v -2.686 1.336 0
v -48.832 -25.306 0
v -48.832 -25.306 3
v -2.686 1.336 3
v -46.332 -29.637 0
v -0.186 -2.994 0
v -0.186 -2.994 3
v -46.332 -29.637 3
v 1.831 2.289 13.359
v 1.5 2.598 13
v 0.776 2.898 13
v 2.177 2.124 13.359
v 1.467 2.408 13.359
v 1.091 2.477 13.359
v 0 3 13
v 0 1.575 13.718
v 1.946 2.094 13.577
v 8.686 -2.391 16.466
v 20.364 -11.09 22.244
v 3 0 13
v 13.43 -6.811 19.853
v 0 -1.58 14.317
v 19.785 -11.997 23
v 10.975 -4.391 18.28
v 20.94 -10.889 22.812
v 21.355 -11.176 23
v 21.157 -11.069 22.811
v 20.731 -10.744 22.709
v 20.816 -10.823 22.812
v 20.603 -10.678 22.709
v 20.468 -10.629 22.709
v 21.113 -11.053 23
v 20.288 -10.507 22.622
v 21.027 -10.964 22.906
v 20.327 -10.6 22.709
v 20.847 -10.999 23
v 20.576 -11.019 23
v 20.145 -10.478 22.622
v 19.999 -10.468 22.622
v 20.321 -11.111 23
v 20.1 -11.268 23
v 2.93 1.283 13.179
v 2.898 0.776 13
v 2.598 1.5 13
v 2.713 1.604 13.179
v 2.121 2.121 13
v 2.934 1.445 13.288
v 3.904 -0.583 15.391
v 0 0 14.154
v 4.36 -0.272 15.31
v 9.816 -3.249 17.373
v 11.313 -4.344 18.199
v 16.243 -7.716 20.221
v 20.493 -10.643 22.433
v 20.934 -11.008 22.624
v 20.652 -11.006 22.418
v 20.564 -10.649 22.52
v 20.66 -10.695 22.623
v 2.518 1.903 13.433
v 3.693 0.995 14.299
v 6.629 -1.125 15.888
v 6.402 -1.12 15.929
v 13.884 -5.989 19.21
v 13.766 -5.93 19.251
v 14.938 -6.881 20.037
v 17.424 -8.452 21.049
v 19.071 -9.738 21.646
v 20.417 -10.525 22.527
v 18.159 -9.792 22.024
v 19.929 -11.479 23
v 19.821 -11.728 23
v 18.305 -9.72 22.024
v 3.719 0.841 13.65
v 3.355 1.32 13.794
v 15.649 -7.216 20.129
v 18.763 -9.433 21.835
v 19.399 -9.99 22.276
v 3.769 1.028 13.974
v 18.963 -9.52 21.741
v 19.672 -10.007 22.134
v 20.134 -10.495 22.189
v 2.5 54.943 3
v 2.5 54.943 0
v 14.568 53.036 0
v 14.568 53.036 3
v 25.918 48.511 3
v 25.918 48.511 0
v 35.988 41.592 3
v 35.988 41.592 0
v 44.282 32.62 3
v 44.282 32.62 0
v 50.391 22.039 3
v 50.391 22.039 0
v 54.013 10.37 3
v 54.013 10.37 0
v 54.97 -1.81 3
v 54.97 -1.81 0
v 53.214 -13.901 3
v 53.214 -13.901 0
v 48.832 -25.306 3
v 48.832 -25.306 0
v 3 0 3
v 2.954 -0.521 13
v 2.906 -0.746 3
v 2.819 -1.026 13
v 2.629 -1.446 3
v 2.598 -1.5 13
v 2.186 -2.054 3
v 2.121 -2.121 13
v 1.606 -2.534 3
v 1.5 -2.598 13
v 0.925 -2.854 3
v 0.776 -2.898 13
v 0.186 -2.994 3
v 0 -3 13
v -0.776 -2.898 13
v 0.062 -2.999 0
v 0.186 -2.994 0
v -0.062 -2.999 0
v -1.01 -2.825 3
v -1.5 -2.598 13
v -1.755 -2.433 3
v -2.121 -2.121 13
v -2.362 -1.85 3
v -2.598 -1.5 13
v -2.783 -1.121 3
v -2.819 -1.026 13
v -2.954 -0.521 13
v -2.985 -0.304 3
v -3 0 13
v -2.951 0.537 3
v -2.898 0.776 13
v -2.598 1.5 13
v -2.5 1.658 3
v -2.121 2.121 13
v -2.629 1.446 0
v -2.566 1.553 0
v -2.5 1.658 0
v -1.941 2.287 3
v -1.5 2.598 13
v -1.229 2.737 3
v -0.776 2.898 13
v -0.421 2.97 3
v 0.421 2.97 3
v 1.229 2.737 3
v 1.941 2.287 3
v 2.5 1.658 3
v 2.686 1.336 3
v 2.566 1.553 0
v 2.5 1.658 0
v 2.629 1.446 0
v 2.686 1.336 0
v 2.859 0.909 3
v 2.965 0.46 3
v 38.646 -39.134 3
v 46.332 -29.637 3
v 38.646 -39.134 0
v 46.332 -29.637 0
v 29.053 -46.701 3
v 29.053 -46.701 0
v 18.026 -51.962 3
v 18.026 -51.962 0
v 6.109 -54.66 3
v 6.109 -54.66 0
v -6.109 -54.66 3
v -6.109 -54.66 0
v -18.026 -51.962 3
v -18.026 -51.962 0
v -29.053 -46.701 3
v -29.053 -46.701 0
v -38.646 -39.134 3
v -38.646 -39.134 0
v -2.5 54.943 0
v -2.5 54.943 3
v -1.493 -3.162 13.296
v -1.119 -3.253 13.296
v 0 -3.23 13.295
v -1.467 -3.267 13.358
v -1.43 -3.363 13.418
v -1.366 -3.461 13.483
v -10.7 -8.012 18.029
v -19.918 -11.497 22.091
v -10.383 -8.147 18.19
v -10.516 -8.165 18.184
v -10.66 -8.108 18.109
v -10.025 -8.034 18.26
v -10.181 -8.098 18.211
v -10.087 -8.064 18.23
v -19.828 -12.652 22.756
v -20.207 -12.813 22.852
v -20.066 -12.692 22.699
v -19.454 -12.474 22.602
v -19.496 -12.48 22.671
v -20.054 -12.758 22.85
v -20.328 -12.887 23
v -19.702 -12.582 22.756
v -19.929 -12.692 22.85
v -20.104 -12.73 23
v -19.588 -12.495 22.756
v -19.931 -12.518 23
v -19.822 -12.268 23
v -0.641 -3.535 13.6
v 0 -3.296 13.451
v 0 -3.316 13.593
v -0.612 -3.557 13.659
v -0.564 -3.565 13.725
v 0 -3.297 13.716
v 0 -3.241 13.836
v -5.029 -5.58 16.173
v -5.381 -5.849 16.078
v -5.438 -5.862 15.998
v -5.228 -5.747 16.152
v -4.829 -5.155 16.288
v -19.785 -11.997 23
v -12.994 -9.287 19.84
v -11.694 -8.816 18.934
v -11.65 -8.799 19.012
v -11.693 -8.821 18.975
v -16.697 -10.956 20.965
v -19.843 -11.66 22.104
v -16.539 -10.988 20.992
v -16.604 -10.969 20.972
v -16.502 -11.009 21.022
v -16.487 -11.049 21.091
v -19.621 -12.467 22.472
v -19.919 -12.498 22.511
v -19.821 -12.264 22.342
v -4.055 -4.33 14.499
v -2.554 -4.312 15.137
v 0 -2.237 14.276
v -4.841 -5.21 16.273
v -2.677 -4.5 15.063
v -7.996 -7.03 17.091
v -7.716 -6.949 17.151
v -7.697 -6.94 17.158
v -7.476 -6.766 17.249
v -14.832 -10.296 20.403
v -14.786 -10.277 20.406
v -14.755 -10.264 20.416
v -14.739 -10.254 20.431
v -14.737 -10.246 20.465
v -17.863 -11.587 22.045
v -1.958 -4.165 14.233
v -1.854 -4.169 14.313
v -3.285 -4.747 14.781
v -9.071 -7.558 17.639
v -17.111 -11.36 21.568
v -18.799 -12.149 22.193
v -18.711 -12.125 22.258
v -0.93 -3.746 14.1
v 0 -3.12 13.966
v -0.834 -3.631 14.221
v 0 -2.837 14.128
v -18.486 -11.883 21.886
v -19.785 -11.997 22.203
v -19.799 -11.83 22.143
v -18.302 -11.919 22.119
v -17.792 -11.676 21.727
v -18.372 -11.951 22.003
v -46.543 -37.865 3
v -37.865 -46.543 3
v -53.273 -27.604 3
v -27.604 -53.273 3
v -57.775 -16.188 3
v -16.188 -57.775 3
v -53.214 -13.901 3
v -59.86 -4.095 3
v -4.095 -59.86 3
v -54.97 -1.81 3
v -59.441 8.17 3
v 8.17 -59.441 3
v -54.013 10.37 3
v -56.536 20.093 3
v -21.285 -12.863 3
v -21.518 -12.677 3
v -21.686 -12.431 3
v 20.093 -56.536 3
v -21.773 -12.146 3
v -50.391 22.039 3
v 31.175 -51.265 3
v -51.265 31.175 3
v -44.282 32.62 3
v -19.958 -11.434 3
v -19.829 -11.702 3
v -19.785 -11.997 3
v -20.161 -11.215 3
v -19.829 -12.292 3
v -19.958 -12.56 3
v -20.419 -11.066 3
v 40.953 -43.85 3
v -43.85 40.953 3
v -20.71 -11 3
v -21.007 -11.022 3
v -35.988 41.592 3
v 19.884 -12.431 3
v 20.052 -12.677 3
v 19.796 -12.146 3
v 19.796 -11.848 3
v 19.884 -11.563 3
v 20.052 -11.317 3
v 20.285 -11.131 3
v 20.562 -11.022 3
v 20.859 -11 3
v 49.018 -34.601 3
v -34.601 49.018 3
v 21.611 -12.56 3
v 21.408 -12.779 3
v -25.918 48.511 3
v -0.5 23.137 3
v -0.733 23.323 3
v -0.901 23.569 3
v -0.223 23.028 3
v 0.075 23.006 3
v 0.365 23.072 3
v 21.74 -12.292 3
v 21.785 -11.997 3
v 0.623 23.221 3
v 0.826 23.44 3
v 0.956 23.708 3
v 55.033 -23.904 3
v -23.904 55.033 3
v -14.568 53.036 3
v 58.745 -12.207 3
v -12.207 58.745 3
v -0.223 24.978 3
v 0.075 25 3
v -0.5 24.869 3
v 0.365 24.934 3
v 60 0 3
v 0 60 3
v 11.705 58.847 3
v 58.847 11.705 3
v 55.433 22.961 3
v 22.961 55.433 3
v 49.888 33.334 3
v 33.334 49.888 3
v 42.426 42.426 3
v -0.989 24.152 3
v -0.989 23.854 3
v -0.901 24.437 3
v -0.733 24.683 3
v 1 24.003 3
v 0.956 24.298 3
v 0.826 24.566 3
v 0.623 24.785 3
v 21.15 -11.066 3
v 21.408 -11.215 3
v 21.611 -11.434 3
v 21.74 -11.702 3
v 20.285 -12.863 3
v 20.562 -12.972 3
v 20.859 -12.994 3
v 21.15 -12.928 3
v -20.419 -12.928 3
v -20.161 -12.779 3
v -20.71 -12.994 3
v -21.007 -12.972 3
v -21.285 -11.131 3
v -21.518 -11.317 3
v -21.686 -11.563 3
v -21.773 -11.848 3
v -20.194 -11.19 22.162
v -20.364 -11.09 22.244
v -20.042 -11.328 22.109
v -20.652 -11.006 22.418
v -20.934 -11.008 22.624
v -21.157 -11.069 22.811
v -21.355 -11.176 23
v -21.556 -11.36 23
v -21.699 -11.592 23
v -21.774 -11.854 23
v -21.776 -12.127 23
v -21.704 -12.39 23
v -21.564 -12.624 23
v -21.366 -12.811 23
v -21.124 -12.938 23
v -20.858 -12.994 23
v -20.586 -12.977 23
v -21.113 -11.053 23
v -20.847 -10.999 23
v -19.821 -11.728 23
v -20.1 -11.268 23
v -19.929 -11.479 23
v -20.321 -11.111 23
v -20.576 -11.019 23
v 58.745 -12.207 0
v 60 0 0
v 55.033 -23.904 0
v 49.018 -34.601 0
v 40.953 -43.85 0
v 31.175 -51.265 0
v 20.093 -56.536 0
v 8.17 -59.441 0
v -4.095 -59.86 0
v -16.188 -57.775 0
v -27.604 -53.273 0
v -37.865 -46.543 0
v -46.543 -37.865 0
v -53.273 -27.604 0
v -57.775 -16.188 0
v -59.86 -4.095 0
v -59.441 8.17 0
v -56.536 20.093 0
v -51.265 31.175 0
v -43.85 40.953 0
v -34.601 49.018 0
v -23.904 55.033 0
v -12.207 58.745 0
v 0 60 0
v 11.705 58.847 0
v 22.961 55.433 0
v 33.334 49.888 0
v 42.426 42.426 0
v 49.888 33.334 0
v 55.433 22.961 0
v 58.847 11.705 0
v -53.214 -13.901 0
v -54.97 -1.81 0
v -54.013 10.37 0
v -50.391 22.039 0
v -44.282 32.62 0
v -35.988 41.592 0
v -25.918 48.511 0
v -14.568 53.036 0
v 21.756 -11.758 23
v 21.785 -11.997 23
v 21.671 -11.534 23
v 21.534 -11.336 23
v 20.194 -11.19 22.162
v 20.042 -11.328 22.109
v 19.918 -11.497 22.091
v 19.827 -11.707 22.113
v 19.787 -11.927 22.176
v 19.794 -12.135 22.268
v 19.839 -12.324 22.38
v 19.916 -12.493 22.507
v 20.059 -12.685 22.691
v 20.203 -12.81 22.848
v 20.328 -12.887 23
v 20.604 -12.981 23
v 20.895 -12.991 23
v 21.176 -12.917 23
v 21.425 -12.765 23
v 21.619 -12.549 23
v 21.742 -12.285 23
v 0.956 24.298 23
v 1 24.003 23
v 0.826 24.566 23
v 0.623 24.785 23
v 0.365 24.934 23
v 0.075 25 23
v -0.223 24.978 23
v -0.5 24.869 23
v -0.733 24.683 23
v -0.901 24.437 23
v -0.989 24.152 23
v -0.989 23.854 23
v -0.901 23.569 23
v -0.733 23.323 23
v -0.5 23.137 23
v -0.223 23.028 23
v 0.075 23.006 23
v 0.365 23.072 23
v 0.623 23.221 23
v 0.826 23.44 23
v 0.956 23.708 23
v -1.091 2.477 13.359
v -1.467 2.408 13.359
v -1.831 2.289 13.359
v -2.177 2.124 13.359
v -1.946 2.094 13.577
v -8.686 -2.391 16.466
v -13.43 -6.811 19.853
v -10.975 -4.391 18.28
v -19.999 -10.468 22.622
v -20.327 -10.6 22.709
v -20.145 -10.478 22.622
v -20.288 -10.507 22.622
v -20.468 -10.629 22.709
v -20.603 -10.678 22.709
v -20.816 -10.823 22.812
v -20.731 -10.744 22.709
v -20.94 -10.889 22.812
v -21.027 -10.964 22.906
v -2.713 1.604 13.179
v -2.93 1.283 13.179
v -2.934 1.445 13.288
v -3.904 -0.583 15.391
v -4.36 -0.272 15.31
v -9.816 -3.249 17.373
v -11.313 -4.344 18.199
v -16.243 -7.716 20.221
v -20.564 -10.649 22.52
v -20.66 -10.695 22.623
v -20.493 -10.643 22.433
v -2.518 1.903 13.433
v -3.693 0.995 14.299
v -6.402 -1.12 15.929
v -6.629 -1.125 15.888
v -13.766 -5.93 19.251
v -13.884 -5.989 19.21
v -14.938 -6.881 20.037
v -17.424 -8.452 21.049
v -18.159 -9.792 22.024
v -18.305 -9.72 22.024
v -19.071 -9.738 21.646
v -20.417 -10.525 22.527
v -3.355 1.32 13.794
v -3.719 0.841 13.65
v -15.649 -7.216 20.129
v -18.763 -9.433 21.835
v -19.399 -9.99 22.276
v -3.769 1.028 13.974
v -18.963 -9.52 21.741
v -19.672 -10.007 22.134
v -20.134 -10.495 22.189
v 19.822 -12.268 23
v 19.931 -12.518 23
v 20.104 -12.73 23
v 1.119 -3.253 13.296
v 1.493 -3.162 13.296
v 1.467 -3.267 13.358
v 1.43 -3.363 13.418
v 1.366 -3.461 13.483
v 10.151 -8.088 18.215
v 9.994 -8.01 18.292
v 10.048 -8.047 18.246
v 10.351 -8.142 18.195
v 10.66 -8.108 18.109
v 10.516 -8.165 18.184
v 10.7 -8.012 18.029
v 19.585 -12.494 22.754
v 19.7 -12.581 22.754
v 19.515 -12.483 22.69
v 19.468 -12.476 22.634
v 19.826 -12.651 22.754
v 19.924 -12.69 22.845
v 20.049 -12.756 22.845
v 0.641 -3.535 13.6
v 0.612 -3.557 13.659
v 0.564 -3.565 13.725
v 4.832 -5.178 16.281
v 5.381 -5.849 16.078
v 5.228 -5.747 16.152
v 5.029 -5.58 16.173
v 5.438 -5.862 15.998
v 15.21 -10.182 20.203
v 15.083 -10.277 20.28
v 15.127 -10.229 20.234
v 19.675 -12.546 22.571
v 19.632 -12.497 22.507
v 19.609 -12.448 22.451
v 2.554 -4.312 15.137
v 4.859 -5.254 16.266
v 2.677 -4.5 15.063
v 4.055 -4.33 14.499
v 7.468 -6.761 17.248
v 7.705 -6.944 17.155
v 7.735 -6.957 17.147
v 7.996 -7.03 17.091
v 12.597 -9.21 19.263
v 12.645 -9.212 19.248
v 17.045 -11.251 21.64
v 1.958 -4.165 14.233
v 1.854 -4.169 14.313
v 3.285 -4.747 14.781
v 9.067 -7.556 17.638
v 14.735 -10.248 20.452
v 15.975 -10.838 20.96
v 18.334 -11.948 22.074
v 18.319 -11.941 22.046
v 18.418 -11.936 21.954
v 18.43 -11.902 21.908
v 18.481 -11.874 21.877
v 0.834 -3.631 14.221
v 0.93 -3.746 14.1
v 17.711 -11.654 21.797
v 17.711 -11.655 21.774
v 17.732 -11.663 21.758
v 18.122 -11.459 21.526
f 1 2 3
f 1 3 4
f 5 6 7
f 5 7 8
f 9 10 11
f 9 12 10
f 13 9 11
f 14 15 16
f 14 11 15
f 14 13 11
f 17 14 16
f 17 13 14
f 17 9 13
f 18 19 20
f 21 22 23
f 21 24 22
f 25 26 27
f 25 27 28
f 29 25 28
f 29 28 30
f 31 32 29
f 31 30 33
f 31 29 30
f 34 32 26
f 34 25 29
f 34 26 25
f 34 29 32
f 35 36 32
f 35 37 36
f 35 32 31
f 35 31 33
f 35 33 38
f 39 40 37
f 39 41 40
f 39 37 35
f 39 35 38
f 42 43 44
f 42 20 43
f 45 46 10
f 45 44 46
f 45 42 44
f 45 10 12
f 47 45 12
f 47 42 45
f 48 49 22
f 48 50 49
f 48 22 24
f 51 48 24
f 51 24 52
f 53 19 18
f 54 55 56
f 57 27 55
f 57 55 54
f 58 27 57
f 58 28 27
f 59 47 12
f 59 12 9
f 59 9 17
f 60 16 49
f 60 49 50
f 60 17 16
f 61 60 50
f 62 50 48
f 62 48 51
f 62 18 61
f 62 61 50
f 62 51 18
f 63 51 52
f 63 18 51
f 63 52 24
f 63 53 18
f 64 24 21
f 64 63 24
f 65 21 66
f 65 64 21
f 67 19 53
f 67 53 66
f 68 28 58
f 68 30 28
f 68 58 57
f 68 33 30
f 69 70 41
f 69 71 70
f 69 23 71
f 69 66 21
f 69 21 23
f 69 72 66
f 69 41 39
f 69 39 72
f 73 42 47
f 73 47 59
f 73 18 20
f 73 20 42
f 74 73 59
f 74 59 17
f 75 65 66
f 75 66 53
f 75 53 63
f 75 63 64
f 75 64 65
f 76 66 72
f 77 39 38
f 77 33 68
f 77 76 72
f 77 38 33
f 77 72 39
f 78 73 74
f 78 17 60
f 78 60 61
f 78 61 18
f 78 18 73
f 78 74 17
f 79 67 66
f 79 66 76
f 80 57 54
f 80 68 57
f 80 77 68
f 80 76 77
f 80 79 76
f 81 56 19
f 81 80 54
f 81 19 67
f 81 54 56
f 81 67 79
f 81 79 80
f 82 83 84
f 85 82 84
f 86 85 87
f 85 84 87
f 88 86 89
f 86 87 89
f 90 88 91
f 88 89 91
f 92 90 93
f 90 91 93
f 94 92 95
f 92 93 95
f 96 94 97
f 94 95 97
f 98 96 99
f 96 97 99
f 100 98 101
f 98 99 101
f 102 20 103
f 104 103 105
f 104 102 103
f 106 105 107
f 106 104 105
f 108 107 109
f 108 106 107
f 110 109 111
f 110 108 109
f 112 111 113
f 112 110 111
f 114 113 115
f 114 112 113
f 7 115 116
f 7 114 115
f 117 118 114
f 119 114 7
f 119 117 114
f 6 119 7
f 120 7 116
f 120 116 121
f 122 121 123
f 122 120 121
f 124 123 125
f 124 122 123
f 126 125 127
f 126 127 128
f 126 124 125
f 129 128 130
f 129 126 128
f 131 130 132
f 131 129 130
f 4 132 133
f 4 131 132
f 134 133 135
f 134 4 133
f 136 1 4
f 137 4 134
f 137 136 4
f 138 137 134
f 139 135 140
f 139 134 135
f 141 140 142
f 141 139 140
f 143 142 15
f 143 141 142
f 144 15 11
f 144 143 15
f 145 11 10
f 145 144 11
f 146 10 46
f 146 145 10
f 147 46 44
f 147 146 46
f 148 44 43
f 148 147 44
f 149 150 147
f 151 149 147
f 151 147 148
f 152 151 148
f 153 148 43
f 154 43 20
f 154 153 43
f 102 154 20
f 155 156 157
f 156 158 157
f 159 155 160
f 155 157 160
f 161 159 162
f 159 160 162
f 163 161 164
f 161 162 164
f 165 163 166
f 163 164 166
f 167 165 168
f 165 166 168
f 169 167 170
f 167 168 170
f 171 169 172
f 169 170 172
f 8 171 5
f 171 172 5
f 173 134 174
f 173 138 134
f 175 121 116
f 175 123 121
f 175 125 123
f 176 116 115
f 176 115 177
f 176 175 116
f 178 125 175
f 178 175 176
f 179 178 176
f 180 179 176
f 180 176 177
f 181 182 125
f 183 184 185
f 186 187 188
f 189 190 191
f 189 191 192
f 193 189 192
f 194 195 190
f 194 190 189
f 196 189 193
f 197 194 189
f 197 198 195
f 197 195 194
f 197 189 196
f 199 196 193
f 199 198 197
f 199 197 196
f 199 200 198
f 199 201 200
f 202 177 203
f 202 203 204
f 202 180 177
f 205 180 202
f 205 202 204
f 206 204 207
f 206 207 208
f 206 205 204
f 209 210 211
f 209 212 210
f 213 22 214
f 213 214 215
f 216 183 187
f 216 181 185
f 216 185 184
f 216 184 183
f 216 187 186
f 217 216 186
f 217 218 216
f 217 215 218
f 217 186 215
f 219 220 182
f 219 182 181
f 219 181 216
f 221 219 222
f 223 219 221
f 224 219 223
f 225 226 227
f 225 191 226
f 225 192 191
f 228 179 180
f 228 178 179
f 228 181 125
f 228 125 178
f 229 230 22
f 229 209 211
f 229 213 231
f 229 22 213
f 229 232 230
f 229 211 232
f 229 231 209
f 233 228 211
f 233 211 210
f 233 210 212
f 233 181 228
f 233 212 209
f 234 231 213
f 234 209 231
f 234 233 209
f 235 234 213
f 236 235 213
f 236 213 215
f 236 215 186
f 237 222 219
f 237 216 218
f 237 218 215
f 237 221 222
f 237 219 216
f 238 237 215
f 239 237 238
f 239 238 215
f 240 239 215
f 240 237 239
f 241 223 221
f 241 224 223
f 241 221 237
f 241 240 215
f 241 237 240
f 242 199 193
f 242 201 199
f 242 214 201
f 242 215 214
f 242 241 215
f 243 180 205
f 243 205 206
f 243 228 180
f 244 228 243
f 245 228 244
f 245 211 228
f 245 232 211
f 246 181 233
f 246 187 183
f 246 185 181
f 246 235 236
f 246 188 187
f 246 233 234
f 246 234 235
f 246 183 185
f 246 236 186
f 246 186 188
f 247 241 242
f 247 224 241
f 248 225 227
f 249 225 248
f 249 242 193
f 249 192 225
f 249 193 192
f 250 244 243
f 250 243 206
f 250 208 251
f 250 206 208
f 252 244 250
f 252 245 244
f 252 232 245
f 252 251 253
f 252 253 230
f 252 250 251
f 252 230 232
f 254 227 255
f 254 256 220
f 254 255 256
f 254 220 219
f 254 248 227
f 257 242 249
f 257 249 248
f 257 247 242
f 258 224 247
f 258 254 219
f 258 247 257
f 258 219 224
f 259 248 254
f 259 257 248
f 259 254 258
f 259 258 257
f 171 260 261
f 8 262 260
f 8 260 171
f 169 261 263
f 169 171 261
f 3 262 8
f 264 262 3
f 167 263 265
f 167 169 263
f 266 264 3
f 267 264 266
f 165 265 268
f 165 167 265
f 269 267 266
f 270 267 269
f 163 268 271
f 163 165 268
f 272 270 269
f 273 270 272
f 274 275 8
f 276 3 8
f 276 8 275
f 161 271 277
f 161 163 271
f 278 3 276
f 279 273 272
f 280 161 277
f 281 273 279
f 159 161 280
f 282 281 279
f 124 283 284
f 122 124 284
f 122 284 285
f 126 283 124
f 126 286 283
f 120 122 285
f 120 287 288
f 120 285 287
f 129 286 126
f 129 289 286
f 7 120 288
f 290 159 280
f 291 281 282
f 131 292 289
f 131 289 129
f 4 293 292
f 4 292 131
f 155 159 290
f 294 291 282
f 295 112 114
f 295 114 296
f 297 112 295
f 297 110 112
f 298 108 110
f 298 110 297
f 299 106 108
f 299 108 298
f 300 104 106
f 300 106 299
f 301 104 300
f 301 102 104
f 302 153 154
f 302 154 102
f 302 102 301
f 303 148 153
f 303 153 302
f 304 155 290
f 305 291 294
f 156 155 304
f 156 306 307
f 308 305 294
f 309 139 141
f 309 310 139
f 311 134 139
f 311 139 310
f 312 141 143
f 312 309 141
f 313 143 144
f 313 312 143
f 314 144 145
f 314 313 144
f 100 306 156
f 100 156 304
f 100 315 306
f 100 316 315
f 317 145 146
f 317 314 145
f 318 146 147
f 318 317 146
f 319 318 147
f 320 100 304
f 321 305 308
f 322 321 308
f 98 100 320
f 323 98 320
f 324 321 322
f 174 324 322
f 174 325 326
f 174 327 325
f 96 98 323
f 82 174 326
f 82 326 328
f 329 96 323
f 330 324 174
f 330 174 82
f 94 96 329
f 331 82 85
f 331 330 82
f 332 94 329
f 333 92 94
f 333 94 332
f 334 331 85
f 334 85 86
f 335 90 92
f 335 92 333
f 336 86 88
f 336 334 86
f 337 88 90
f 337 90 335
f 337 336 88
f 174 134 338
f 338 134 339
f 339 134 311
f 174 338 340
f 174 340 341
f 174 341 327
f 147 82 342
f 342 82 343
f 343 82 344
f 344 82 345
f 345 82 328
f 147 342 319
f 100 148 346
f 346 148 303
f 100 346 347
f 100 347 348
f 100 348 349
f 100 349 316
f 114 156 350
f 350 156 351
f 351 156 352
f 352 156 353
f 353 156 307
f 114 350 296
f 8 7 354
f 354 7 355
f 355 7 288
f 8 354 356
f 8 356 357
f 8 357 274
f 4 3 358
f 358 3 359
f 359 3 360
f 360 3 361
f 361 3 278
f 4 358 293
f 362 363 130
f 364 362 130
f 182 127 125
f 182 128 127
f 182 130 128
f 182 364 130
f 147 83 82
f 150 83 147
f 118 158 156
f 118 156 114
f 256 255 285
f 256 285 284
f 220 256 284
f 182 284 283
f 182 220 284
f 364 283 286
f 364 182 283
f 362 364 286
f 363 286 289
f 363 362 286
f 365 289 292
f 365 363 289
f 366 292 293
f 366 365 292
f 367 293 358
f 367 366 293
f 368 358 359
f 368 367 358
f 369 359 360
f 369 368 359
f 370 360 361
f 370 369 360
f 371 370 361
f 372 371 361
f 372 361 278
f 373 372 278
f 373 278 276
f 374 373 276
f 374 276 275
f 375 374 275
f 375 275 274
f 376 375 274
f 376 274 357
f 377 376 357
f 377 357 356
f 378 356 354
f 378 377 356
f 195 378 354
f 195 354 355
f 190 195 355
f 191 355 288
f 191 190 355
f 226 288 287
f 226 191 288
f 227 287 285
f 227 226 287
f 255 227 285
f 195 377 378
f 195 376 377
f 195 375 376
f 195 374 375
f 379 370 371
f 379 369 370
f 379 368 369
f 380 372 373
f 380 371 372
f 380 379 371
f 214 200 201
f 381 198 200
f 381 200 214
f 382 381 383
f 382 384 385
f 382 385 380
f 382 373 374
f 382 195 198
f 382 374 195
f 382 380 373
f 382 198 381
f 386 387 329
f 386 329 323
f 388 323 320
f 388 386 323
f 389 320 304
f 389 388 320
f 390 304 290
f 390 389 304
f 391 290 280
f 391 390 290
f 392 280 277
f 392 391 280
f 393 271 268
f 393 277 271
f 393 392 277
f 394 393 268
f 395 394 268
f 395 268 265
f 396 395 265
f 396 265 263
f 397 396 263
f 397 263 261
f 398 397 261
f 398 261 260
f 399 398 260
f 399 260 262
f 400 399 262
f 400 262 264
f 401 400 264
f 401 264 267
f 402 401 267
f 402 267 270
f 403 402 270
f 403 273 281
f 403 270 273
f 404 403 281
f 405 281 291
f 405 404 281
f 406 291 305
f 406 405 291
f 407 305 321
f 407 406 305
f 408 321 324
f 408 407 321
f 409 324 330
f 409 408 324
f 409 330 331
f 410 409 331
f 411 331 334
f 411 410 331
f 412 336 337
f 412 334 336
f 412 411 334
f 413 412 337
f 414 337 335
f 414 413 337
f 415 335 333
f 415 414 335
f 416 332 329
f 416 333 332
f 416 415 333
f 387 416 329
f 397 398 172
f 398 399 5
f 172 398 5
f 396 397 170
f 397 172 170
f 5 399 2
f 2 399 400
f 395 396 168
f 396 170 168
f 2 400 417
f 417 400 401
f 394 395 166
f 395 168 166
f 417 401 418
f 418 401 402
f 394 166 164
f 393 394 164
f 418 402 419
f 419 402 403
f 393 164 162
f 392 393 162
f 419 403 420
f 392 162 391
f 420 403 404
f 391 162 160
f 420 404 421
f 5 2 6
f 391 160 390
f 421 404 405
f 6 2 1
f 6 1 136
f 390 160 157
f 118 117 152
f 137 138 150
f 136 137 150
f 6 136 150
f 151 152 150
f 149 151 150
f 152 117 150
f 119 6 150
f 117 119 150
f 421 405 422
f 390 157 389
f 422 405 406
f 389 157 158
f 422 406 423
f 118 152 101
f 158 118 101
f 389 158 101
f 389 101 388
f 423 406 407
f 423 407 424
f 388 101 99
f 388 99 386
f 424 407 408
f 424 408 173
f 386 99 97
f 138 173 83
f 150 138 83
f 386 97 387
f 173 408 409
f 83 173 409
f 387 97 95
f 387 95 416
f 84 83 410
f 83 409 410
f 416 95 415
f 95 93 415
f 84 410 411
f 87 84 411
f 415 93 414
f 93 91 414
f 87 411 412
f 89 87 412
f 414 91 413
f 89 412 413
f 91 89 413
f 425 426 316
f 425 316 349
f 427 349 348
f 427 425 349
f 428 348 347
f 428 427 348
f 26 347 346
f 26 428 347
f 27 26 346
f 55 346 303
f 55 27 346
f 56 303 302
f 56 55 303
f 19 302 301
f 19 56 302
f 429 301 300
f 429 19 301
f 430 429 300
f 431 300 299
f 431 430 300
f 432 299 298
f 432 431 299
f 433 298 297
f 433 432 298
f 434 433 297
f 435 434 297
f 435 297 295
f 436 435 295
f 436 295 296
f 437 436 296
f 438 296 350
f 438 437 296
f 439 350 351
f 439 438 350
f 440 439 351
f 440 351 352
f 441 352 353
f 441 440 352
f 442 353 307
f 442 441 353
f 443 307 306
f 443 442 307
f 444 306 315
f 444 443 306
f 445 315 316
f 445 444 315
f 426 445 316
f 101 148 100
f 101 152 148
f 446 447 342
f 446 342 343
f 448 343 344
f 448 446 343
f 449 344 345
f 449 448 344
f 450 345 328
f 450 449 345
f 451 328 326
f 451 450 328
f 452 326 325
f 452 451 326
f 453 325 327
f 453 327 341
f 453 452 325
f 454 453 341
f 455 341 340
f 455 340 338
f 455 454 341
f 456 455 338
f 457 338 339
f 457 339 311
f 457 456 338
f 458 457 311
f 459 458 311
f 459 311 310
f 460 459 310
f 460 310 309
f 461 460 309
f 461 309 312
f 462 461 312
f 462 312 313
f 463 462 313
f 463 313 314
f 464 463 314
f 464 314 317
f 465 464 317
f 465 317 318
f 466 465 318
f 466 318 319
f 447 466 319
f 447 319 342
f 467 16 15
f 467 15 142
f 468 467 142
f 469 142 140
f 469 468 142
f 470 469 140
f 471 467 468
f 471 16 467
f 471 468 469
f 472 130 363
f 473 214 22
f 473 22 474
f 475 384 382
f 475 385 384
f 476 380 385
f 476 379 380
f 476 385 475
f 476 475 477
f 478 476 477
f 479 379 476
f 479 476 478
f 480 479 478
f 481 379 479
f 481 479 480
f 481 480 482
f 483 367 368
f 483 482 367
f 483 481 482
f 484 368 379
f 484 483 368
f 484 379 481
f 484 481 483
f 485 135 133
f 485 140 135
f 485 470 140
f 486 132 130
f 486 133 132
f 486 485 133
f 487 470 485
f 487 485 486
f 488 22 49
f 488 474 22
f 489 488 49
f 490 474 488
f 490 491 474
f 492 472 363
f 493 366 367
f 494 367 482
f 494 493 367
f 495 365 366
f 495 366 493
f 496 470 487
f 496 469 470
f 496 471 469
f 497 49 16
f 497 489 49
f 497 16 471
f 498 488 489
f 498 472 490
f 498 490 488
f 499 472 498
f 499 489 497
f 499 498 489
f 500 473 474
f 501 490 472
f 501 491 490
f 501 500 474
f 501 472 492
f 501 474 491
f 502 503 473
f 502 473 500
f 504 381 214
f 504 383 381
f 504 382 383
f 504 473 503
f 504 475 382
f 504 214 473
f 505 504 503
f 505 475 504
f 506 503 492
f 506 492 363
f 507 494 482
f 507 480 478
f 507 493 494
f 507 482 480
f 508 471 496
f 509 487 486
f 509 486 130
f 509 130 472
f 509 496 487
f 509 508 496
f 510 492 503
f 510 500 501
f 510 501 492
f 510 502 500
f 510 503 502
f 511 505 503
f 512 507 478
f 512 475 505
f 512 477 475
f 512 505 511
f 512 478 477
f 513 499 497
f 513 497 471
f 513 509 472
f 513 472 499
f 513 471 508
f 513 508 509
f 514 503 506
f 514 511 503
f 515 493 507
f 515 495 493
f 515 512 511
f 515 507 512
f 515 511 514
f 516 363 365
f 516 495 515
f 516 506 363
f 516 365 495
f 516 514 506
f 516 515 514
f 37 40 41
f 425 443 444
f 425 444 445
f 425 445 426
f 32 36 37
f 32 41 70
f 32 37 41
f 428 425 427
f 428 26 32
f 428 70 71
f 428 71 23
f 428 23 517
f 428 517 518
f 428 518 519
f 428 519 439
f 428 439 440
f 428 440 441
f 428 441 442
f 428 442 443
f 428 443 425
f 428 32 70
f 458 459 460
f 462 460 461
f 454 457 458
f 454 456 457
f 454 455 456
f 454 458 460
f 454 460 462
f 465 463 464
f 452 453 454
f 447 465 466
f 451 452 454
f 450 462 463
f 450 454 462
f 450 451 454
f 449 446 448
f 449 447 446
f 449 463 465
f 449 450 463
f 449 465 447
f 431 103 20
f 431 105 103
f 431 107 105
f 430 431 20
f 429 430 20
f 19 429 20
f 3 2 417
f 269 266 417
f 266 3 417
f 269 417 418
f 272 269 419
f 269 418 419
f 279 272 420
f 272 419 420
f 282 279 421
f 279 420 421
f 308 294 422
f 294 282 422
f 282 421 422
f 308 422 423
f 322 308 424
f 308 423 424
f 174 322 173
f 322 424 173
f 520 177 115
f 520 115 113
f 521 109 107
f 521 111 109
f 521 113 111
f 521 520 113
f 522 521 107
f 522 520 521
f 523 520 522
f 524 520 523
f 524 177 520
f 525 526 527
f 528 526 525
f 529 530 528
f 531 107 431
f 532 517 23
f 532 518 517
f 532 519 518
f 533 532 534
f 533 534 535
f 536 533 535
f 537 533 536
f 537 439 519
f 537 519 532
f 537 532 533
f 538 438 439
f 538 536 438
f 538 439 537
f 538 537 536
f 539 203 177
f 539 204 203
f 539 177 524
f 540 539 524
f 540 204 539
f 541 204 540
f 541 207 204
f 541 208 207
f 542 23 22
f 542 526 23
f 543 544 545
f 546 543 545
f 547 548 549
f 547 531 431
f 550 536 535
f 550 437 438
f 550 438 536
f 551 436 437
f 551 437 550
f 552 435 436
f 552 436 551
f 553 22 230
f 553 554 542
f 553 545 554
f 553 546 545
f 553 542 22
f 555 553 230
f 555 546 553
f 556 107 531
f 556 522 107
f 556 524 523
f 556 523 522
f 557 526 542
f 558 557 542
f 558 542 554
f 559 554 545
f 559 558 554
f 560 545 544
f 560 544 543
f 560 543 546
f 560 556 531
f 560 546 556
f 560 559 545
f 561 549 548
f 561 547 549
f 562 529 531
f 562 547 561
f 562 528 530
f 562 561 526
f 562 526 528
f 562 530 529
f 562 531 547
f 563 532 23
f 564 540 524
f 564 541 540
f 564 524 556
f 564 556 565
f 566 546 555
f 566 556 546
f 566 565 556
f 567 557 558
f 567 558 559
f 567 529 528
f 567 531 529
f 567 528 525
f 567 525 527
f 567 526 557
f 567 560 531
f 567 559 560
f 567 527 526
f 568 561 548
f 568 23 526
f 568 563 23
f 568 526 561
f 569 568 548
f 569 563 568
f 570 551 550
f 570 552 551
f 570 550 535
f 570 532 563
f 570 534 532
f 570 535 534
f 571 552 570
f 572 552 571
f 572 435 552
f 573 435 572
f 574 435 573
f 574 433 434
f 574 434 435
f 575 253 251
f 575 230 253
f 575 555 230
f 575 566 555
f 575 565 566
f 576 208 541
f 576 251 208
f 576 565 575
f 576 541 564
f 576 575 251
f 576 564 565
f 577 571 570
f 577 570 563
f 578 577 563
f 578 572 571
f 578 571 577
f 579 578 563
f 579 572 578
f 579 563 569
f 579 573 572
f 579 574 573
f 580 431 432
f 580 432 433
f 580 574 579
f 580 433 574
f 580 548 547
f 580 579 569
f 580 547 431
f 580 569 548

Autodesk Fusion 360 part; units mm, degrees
sketch "スケッチ1" plane through (0, 0, 0) normal (0, 0, 1) x (1, 0, 0)
  circle A0 centre (0, 0) radius 76
  line L0 (-25, 0) -> (125, 0)
  circle A1 centre (120, 0) radius 5
  ellipse E0 centre (0, 0) end of major axis (125, 0) minor radius 90
  line L1 (-125, 0) -> (125, 0)
  line L2 (0, -90) -> (0, 90)
  ellipse E1 centre (0, 0) end of major axis (115, 0) minor radius 80
  line L3 (-115, 0) -> (115, 0)
  line L4 (0, -80) -> (0, 80)
  circle A2 centre (0, 85) radius 5
  circle A3 centre (0, -85) radius 5
  line L5 (120, 0) -> (115, 0)
  line L6 (120, 5) -> (120, 0)
  line L7 (115, 5) -> (125, 5)
  line L8 (125, 5) -> (125, -5)
  line L9 (125, -5) -> (115, -5)
  line L10 (115, -5) -> (115, 5)
  dimension "d1" = 152
  dimension "d2" = 150
extrude "押し出し1" add sketch "スケッチ1" along normal blind 141 contours A0 L0 L1 L2 L3 L4 | A0 L0 L1 L2 L3 L4 | A0 L0 L1 L2 L3 L4 | A0 L0 L1 L2 L3 L4 makes body 1
extrude "押し出し2" add sketch "スケッチ1" along normal blind 3 separate body contours E0 E1 A3 L9 L10 | E0 E1 A2 L7 L10 | L2 A2 | L2 A2 | L2 A3 | L2 A3 makes body 2 at (30.5782, -83.5354, 0)
sketch "スケッチ2" plane through (0, 0, 0) normal (0, 1, 0) x (1, 0, 0)
  line L0 (0, -170) -> (100, -170)
  line L1 (120, -150) -> (120, 0)
  arc A0 (100, -170) -> (120, -150) centre (100, -150) ccw
  line L2 (0, -170) -> (0, -175)
  line L3 (0, -175) -> (100, -175)
  line L4 (100, -175) -> (100, -165)
  line L5 (100, -165) -> (0, -165)
  line L6 (0, -165) -> (0, -175)
  circle A1 centre (100, -150) radius 15
  circle A2 centre (100, -150) radius 25
  line L7 (125, -150) -> (115, -150)
  line L8 (115, -150) -> (115, 0)
  line L9 (115, 0) -> (125, 0)
  line L10 (125, 0) -> (125, -150)
  dimension "d11" = 20
  dimension "d24" = 5
  dimension "d25" = 100
  dimension "d26" = 10
ref_plane "作業平面1" through (0, 0, 170) normal (0, 0, 1) x (1, 0, 0)
sketch "スケッチ3" plane through (0, 0, 170) normal (0, 0, 1) x (1, 0, 0)
  circle A0 centre (0, 0) radius 3
  circle A1 centre (0, 0) radius 5
  circle A2 centre (0, 0) radius 2.5
  line L0 (0, 0) -> (-5, 0)
  line L1 (0, 0) -> (-2.5, 4.3301)
  line L2 (0, 0) -> (-2.5, -4.3301)
  circle A3 centre (-1.875, 3.2476) radius 1.25
  circle A4 centre (-1.875, -3.2476) radius 1.25
  line L3 (0, 0) -> (5, 0)
  line L4 (0, 0) -> (0, 5)
  line L5 (0, 0) -> (0, -5)
  arc A5 (0, 3) -> (-1.25, 2.1651) centre (-0.2231, 1.9809) ccw
  arc A6 (-1.25, -2.1651) -> (0, -3) centre (-0.2231, -1.9809) ccw
  dimension "d17" = 6
  dimension "d18" = 10
  dimension "d23" = 5
extrude "押し出し4" add sketch "スケッチ3" along normal mid plane 10 separate body contours A0 A1 L3 L5 | A0 A1 L3 L4 | A1 A3 L4 A5 | A0 A5 | A0 A6 | A1 A4 L5 A6 | A0 L1 A5 | A0 L1 A3 | A0 L2 A4 | A0 L2 A6 | A0 L1 A3 | A0 L1 A3 | A0 L2 A4 | A0 L2 A4 makes body 3
extrude "押し出し6" add sketch "スケッチ2" along normal mid plane 10 contours L0 L5 L6 A2 | L0 L2 L3 L6 A2 | L0 L4 L5 A2 | L0 L4 A2 | A0 L4 A1 L7 | A0 L4 A2 L7 | L1 A2 L7 L8 | L1 A2 L7 | L1 A2 L8 L9 | L1 A2 L9 L10 bodies 3 2
extrude "押し出し5" cut sketch "スケッチ3" along normal mid plane 10 contours A0 A2 L3 L4 | A0 A2 L3 L5 | A0 A2 A3 L4 | A0 A6 | A0 A2 A4 L5 | A2 L3 L4 | A2 L3 L5 | A3 A5 | A2 L1 L4 | A4 A6 bodies 3
extrude "押し出し7" cut sketch "スケッチ1" along normal blind 175 contours E0 L8 L9 | E0 L7 L8 bodies 3
sketch "スケッチ4" plane through (0, 0, 0) normal (0, 0, 1) x (1, 0, 0)
  circle A0 centre (85, 0) radius 3
  circle A1 centre (75, 0) radius 3
  dimension "d66" = 6
  dimension "d68" = 6
extrude "押し出し8" add sketch "スケッチ4" along normal blind 150 separate body makes body 4 at (85.8125, 2.8879, 100) makes body 5 at (75.8125, 2.8879, 100)
sketch "スケッチ5" plane through (0, 0, 150) normal (0, 0, 1) x (-1, 0, 0)
  circle A0 centre (-85, 0) radius 3
  circle A1 centre (-75, 0) radius 3
  circle A2 centre (-85, 0) radius 1.5
  circle A3 centre (-75, 0) radius 1.6
  dimension "d69" = 3
  dimension "d70" = 3.2
extrude "押し出し9" add sketch "スケッチ5" along normal blind 3 contours A2 bodies 4
extrude "押し出し10" cut sketch "スケッチ5" against normal blind 3 contours A3 bodies 5
sketch "スケッチ6" plane through (0, 0, 0) normal (0, 0, 1) x (1, 0, 0)
  circle A0 centre (0, 0) radius 60
  circle A1 centre (0, 0) radius 55
  circle A2 centre (0, 0) radius 25
  line L0 (0, 0) -> (0, 60)
  line L1 (2.5, 55) -> (2.5, 0)
  line L2 (2.5, 0) -> (-2.5, 0)
  line L3 (-2.5, 0) -> (-2.5, 55)
  line L4 (1.25, -2.1651) -> (-46.3814, -29.6651)
  line L5 (-48.8814, -25.3349) -> (-1.25, 2.1651)
  line L6 (-1.25, 2.1651) -> (1.25, -2.1651)
  line L7 (1.25, 2.1651) -> (48.8814, -25.3349)
  line L8 (46.3814, -29.6651) -> (-1.25, -2.1651)
  line L9 (-1.25, -2.1651) -> (1.25, 2.1651)
  circle A3 centre (0, 0) radius 3
  dimension "d41" = 50
  dimension "d43" = 5
  dimension "d45" = 360
  dimension "d48" = 6
extrude "押し出し11" add sketch "スケッチ6" along normal blind 3 separate body contours A1 A2 L0 L1 | A1 A2 L0 L3 | A0 | A2 L0 L3 A3 | A2 L0 L1 A3 | A1 A2 L4 L5 | L0 L1 L7 L9 A3 | L0 L3 L5 L6 A3 | A1 A2 L7 L8 | A2 L4 L5 A3 | L1 L2 L7 L9 | L2 L3 L4 L5 L8 L9 A3 | L2 L3 L5 L6 | L1 L2 L4 L6 L7 L8 A3 | L4 L6 L8 L9 | A2 L7 L8 A3 makes body 6
extrude "押し出し12" add sketch "スケッチ6" along normal blind 13 contours L0 L1 L7 L9 A3 | L0 L3 L5 L6 A3 | L1 L7 A3 | L3 L5 A3 | L1 L2 L7 L9 | L2 L3 L4 L5 L8 L9 A3 | L2 L3 L5 L6 | L1 L2 L4 L6 L7 L8 A3 | L4 L6 L8 L9 | L4 L8 A3 bodies 6
ref_plane "作業平面2" through (0, 0, 23) normal (0, 0, 1) x (1, 0, 0)
sketch "スケッチ7" plane through (0, 0.0029, 23) normal (0, 0, 1) x (1, 0, 0)
  circle A0 centre (0, 0) radius 25
  line L0 (0, 0) -> (25, 0) construction
  line L1 (0, 0) -> (26.2494, 0) construction
  line L2 (0, 0) -> (28.4476, 0) construction
  circle A1 centre (-20.7846, -12) radius 1
  circle A2 centre (20.7846, -12) radius 1
  circle A3 centre (0, 24) radius 1
  dimension "d61" = 2
  dimension "d62" = 2
  dimension "d63" = 2
sketch "スケッチ8" plane through (0, 0, 13) normal (0, 0, 1) x (-1, 0, 0)
  circle A0 centre (0, 0) radius 3
  circle A1 centre (0, 0) radius 3
loft "ロフト1" add profiles "スケッチ8", "スケッチ7" section 1 section 2 contours A3 bodies 6
loft "ロフト2" add profiles "スケッチ8", "スケッチ7" section 1 section 2 contours A1 bodies 6
loft "ロフト3" add profiles "スケッチ8", "スケッチ7" section 1 section 2 contours A2 bodies 6
extrude "押し出し13" add sketch "スケッチ7" against normal blind 20 contours A3 | A1 | A2 bodies 6
hidden bodies 1 3 4 5
